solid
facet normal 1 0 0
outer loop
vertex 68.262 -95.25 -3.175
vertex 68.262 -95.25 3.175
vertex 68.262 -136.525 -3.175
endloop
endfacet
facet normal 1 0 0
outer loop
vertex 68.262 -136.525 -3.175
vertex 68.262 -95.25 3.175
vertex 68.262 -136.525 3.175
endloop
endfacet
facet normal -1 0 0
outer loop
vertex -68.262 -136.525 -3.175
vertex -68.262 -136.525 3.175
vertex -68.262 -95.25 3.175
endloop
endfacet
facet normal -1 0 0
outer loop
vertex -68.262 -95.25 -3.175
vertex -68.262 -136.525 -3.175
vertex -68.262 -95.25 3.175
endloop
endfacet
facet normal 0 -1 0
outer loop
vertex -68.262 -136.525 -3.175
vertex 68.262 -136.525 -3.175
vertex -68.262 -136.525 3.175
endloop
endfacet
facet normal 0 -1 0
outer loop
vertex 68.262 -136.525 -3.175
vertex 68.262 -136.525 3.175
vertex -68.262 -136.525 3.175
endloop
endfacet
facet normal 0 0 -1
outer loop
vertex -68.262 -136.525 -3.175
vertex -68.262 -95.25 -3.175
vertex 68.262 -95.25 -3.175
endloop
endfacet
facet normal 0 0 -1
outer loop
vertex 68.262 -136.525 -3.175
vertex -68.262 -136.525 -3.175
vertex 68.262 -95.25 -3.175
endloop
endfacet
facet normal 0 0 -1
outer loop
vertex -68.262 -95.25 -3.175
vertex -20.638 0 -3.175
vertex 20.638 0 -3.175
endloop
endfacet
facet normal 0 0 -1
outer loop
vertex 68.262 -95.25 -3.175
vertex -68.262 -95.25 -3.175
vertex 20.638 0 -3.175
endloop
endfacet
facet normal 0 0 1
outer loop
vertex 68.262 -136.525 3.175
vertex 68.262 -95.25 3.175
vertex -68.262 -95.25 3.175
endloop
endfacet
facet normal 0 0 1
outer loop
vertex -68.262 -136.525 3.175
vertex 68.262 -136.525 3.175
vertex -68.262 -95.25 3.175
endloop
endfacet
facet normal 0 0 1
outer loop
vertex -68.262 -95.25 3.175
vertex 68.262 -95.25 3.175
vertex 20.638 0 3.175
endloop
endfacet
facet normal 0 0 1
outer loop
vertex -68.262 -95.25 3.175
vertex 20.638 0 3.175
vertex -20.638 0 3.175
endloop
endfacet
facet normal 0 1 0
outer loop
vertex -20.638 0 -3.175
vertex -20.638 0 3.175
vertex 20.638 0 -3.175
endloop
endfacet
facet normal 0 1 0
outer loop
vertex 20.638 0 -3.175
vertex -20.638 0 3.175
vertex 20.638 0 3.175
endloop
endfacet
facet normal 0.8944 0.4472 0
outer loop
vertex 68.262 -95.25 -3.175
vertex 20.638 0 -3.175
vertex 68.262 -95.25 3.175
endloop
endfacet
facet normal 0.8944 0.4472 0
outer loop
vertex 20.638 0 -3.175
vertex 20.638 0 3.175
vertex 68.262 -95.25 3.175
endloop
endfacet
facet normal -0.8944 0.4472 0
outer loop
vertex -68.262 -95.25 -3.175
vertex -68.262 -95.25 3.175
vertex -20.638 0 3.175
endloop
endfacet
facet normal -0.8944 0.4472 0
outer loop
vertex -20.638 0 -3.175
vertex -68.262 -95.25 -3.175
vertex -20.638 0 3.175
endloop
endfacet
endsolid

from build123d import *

# Parameters (mm, degrees)
SKETCH1_R           = 7.14375
BOSS_EXTRUDE1_DEPTH = 3.175
BOSS_EXTRUDE3_START = -6.35
SKETCH2_R           = 7.14375
BOSS_EXTRUDE3_DEPTH = 6.35


with BuildPart() as part:
    # Sketch1 → Boss-Extrude1 (new, symmetric)
    with BuildSketch(Plane.XY):
        Polygon((-20.6375, 0), (20.6375, 0), (68.2625, -95.25), (68.2625, -136.525), (-68.2625, -136.525), (-68.2625, -95.25), align=None)
        with Locations((0, -115.8875)):
            Circle(SKETCH1_R, mode=Mode.SUBTRACT)
        with Locations((0, -68.2625)):
            Circle(SKETCH1_R, mode=Mode.SUBTRACT)
        with Locations((0, -20.6375)):
            Circle(SKETCH1_R, mode=Mode.SUBTRACT)
        with Locations((47.625, -115.8875)):
            Circle(SKETCH1_R, mode=Mode.SUBTRACT)
        with Locations((-47.625, -115.8875)):
            Circle(SKETCH1_R, mode=Mode.SUBTRACT)
    extrude(amount=BOSS_EXTRUDE1_DEPTH, both=True)

    # Sketch2 → Boss-Extrude3 (add)
    with BuildSketch(Plane.XY.offset(3.175).offset(BOSS_EXTRUDE3_START)):
        with Locations((0, -68.2625)):
            Circle(SKETCH2_R)
        with Locations((0, -20.6375)):
            Circle(SKETCH2_R)
        with Locations((-47.625, -115.8875)):
            Circle(SKETCH2_R)
        with Locations((0, -115.8875)):
            Circle(SKETCH2_R)
        with Locations((47.625, -115.8875)):
            Circle(SKETCH2_R)
    extrude(amount=BOSS_EXTRUDE3_DEPTH)


solid = part.part
